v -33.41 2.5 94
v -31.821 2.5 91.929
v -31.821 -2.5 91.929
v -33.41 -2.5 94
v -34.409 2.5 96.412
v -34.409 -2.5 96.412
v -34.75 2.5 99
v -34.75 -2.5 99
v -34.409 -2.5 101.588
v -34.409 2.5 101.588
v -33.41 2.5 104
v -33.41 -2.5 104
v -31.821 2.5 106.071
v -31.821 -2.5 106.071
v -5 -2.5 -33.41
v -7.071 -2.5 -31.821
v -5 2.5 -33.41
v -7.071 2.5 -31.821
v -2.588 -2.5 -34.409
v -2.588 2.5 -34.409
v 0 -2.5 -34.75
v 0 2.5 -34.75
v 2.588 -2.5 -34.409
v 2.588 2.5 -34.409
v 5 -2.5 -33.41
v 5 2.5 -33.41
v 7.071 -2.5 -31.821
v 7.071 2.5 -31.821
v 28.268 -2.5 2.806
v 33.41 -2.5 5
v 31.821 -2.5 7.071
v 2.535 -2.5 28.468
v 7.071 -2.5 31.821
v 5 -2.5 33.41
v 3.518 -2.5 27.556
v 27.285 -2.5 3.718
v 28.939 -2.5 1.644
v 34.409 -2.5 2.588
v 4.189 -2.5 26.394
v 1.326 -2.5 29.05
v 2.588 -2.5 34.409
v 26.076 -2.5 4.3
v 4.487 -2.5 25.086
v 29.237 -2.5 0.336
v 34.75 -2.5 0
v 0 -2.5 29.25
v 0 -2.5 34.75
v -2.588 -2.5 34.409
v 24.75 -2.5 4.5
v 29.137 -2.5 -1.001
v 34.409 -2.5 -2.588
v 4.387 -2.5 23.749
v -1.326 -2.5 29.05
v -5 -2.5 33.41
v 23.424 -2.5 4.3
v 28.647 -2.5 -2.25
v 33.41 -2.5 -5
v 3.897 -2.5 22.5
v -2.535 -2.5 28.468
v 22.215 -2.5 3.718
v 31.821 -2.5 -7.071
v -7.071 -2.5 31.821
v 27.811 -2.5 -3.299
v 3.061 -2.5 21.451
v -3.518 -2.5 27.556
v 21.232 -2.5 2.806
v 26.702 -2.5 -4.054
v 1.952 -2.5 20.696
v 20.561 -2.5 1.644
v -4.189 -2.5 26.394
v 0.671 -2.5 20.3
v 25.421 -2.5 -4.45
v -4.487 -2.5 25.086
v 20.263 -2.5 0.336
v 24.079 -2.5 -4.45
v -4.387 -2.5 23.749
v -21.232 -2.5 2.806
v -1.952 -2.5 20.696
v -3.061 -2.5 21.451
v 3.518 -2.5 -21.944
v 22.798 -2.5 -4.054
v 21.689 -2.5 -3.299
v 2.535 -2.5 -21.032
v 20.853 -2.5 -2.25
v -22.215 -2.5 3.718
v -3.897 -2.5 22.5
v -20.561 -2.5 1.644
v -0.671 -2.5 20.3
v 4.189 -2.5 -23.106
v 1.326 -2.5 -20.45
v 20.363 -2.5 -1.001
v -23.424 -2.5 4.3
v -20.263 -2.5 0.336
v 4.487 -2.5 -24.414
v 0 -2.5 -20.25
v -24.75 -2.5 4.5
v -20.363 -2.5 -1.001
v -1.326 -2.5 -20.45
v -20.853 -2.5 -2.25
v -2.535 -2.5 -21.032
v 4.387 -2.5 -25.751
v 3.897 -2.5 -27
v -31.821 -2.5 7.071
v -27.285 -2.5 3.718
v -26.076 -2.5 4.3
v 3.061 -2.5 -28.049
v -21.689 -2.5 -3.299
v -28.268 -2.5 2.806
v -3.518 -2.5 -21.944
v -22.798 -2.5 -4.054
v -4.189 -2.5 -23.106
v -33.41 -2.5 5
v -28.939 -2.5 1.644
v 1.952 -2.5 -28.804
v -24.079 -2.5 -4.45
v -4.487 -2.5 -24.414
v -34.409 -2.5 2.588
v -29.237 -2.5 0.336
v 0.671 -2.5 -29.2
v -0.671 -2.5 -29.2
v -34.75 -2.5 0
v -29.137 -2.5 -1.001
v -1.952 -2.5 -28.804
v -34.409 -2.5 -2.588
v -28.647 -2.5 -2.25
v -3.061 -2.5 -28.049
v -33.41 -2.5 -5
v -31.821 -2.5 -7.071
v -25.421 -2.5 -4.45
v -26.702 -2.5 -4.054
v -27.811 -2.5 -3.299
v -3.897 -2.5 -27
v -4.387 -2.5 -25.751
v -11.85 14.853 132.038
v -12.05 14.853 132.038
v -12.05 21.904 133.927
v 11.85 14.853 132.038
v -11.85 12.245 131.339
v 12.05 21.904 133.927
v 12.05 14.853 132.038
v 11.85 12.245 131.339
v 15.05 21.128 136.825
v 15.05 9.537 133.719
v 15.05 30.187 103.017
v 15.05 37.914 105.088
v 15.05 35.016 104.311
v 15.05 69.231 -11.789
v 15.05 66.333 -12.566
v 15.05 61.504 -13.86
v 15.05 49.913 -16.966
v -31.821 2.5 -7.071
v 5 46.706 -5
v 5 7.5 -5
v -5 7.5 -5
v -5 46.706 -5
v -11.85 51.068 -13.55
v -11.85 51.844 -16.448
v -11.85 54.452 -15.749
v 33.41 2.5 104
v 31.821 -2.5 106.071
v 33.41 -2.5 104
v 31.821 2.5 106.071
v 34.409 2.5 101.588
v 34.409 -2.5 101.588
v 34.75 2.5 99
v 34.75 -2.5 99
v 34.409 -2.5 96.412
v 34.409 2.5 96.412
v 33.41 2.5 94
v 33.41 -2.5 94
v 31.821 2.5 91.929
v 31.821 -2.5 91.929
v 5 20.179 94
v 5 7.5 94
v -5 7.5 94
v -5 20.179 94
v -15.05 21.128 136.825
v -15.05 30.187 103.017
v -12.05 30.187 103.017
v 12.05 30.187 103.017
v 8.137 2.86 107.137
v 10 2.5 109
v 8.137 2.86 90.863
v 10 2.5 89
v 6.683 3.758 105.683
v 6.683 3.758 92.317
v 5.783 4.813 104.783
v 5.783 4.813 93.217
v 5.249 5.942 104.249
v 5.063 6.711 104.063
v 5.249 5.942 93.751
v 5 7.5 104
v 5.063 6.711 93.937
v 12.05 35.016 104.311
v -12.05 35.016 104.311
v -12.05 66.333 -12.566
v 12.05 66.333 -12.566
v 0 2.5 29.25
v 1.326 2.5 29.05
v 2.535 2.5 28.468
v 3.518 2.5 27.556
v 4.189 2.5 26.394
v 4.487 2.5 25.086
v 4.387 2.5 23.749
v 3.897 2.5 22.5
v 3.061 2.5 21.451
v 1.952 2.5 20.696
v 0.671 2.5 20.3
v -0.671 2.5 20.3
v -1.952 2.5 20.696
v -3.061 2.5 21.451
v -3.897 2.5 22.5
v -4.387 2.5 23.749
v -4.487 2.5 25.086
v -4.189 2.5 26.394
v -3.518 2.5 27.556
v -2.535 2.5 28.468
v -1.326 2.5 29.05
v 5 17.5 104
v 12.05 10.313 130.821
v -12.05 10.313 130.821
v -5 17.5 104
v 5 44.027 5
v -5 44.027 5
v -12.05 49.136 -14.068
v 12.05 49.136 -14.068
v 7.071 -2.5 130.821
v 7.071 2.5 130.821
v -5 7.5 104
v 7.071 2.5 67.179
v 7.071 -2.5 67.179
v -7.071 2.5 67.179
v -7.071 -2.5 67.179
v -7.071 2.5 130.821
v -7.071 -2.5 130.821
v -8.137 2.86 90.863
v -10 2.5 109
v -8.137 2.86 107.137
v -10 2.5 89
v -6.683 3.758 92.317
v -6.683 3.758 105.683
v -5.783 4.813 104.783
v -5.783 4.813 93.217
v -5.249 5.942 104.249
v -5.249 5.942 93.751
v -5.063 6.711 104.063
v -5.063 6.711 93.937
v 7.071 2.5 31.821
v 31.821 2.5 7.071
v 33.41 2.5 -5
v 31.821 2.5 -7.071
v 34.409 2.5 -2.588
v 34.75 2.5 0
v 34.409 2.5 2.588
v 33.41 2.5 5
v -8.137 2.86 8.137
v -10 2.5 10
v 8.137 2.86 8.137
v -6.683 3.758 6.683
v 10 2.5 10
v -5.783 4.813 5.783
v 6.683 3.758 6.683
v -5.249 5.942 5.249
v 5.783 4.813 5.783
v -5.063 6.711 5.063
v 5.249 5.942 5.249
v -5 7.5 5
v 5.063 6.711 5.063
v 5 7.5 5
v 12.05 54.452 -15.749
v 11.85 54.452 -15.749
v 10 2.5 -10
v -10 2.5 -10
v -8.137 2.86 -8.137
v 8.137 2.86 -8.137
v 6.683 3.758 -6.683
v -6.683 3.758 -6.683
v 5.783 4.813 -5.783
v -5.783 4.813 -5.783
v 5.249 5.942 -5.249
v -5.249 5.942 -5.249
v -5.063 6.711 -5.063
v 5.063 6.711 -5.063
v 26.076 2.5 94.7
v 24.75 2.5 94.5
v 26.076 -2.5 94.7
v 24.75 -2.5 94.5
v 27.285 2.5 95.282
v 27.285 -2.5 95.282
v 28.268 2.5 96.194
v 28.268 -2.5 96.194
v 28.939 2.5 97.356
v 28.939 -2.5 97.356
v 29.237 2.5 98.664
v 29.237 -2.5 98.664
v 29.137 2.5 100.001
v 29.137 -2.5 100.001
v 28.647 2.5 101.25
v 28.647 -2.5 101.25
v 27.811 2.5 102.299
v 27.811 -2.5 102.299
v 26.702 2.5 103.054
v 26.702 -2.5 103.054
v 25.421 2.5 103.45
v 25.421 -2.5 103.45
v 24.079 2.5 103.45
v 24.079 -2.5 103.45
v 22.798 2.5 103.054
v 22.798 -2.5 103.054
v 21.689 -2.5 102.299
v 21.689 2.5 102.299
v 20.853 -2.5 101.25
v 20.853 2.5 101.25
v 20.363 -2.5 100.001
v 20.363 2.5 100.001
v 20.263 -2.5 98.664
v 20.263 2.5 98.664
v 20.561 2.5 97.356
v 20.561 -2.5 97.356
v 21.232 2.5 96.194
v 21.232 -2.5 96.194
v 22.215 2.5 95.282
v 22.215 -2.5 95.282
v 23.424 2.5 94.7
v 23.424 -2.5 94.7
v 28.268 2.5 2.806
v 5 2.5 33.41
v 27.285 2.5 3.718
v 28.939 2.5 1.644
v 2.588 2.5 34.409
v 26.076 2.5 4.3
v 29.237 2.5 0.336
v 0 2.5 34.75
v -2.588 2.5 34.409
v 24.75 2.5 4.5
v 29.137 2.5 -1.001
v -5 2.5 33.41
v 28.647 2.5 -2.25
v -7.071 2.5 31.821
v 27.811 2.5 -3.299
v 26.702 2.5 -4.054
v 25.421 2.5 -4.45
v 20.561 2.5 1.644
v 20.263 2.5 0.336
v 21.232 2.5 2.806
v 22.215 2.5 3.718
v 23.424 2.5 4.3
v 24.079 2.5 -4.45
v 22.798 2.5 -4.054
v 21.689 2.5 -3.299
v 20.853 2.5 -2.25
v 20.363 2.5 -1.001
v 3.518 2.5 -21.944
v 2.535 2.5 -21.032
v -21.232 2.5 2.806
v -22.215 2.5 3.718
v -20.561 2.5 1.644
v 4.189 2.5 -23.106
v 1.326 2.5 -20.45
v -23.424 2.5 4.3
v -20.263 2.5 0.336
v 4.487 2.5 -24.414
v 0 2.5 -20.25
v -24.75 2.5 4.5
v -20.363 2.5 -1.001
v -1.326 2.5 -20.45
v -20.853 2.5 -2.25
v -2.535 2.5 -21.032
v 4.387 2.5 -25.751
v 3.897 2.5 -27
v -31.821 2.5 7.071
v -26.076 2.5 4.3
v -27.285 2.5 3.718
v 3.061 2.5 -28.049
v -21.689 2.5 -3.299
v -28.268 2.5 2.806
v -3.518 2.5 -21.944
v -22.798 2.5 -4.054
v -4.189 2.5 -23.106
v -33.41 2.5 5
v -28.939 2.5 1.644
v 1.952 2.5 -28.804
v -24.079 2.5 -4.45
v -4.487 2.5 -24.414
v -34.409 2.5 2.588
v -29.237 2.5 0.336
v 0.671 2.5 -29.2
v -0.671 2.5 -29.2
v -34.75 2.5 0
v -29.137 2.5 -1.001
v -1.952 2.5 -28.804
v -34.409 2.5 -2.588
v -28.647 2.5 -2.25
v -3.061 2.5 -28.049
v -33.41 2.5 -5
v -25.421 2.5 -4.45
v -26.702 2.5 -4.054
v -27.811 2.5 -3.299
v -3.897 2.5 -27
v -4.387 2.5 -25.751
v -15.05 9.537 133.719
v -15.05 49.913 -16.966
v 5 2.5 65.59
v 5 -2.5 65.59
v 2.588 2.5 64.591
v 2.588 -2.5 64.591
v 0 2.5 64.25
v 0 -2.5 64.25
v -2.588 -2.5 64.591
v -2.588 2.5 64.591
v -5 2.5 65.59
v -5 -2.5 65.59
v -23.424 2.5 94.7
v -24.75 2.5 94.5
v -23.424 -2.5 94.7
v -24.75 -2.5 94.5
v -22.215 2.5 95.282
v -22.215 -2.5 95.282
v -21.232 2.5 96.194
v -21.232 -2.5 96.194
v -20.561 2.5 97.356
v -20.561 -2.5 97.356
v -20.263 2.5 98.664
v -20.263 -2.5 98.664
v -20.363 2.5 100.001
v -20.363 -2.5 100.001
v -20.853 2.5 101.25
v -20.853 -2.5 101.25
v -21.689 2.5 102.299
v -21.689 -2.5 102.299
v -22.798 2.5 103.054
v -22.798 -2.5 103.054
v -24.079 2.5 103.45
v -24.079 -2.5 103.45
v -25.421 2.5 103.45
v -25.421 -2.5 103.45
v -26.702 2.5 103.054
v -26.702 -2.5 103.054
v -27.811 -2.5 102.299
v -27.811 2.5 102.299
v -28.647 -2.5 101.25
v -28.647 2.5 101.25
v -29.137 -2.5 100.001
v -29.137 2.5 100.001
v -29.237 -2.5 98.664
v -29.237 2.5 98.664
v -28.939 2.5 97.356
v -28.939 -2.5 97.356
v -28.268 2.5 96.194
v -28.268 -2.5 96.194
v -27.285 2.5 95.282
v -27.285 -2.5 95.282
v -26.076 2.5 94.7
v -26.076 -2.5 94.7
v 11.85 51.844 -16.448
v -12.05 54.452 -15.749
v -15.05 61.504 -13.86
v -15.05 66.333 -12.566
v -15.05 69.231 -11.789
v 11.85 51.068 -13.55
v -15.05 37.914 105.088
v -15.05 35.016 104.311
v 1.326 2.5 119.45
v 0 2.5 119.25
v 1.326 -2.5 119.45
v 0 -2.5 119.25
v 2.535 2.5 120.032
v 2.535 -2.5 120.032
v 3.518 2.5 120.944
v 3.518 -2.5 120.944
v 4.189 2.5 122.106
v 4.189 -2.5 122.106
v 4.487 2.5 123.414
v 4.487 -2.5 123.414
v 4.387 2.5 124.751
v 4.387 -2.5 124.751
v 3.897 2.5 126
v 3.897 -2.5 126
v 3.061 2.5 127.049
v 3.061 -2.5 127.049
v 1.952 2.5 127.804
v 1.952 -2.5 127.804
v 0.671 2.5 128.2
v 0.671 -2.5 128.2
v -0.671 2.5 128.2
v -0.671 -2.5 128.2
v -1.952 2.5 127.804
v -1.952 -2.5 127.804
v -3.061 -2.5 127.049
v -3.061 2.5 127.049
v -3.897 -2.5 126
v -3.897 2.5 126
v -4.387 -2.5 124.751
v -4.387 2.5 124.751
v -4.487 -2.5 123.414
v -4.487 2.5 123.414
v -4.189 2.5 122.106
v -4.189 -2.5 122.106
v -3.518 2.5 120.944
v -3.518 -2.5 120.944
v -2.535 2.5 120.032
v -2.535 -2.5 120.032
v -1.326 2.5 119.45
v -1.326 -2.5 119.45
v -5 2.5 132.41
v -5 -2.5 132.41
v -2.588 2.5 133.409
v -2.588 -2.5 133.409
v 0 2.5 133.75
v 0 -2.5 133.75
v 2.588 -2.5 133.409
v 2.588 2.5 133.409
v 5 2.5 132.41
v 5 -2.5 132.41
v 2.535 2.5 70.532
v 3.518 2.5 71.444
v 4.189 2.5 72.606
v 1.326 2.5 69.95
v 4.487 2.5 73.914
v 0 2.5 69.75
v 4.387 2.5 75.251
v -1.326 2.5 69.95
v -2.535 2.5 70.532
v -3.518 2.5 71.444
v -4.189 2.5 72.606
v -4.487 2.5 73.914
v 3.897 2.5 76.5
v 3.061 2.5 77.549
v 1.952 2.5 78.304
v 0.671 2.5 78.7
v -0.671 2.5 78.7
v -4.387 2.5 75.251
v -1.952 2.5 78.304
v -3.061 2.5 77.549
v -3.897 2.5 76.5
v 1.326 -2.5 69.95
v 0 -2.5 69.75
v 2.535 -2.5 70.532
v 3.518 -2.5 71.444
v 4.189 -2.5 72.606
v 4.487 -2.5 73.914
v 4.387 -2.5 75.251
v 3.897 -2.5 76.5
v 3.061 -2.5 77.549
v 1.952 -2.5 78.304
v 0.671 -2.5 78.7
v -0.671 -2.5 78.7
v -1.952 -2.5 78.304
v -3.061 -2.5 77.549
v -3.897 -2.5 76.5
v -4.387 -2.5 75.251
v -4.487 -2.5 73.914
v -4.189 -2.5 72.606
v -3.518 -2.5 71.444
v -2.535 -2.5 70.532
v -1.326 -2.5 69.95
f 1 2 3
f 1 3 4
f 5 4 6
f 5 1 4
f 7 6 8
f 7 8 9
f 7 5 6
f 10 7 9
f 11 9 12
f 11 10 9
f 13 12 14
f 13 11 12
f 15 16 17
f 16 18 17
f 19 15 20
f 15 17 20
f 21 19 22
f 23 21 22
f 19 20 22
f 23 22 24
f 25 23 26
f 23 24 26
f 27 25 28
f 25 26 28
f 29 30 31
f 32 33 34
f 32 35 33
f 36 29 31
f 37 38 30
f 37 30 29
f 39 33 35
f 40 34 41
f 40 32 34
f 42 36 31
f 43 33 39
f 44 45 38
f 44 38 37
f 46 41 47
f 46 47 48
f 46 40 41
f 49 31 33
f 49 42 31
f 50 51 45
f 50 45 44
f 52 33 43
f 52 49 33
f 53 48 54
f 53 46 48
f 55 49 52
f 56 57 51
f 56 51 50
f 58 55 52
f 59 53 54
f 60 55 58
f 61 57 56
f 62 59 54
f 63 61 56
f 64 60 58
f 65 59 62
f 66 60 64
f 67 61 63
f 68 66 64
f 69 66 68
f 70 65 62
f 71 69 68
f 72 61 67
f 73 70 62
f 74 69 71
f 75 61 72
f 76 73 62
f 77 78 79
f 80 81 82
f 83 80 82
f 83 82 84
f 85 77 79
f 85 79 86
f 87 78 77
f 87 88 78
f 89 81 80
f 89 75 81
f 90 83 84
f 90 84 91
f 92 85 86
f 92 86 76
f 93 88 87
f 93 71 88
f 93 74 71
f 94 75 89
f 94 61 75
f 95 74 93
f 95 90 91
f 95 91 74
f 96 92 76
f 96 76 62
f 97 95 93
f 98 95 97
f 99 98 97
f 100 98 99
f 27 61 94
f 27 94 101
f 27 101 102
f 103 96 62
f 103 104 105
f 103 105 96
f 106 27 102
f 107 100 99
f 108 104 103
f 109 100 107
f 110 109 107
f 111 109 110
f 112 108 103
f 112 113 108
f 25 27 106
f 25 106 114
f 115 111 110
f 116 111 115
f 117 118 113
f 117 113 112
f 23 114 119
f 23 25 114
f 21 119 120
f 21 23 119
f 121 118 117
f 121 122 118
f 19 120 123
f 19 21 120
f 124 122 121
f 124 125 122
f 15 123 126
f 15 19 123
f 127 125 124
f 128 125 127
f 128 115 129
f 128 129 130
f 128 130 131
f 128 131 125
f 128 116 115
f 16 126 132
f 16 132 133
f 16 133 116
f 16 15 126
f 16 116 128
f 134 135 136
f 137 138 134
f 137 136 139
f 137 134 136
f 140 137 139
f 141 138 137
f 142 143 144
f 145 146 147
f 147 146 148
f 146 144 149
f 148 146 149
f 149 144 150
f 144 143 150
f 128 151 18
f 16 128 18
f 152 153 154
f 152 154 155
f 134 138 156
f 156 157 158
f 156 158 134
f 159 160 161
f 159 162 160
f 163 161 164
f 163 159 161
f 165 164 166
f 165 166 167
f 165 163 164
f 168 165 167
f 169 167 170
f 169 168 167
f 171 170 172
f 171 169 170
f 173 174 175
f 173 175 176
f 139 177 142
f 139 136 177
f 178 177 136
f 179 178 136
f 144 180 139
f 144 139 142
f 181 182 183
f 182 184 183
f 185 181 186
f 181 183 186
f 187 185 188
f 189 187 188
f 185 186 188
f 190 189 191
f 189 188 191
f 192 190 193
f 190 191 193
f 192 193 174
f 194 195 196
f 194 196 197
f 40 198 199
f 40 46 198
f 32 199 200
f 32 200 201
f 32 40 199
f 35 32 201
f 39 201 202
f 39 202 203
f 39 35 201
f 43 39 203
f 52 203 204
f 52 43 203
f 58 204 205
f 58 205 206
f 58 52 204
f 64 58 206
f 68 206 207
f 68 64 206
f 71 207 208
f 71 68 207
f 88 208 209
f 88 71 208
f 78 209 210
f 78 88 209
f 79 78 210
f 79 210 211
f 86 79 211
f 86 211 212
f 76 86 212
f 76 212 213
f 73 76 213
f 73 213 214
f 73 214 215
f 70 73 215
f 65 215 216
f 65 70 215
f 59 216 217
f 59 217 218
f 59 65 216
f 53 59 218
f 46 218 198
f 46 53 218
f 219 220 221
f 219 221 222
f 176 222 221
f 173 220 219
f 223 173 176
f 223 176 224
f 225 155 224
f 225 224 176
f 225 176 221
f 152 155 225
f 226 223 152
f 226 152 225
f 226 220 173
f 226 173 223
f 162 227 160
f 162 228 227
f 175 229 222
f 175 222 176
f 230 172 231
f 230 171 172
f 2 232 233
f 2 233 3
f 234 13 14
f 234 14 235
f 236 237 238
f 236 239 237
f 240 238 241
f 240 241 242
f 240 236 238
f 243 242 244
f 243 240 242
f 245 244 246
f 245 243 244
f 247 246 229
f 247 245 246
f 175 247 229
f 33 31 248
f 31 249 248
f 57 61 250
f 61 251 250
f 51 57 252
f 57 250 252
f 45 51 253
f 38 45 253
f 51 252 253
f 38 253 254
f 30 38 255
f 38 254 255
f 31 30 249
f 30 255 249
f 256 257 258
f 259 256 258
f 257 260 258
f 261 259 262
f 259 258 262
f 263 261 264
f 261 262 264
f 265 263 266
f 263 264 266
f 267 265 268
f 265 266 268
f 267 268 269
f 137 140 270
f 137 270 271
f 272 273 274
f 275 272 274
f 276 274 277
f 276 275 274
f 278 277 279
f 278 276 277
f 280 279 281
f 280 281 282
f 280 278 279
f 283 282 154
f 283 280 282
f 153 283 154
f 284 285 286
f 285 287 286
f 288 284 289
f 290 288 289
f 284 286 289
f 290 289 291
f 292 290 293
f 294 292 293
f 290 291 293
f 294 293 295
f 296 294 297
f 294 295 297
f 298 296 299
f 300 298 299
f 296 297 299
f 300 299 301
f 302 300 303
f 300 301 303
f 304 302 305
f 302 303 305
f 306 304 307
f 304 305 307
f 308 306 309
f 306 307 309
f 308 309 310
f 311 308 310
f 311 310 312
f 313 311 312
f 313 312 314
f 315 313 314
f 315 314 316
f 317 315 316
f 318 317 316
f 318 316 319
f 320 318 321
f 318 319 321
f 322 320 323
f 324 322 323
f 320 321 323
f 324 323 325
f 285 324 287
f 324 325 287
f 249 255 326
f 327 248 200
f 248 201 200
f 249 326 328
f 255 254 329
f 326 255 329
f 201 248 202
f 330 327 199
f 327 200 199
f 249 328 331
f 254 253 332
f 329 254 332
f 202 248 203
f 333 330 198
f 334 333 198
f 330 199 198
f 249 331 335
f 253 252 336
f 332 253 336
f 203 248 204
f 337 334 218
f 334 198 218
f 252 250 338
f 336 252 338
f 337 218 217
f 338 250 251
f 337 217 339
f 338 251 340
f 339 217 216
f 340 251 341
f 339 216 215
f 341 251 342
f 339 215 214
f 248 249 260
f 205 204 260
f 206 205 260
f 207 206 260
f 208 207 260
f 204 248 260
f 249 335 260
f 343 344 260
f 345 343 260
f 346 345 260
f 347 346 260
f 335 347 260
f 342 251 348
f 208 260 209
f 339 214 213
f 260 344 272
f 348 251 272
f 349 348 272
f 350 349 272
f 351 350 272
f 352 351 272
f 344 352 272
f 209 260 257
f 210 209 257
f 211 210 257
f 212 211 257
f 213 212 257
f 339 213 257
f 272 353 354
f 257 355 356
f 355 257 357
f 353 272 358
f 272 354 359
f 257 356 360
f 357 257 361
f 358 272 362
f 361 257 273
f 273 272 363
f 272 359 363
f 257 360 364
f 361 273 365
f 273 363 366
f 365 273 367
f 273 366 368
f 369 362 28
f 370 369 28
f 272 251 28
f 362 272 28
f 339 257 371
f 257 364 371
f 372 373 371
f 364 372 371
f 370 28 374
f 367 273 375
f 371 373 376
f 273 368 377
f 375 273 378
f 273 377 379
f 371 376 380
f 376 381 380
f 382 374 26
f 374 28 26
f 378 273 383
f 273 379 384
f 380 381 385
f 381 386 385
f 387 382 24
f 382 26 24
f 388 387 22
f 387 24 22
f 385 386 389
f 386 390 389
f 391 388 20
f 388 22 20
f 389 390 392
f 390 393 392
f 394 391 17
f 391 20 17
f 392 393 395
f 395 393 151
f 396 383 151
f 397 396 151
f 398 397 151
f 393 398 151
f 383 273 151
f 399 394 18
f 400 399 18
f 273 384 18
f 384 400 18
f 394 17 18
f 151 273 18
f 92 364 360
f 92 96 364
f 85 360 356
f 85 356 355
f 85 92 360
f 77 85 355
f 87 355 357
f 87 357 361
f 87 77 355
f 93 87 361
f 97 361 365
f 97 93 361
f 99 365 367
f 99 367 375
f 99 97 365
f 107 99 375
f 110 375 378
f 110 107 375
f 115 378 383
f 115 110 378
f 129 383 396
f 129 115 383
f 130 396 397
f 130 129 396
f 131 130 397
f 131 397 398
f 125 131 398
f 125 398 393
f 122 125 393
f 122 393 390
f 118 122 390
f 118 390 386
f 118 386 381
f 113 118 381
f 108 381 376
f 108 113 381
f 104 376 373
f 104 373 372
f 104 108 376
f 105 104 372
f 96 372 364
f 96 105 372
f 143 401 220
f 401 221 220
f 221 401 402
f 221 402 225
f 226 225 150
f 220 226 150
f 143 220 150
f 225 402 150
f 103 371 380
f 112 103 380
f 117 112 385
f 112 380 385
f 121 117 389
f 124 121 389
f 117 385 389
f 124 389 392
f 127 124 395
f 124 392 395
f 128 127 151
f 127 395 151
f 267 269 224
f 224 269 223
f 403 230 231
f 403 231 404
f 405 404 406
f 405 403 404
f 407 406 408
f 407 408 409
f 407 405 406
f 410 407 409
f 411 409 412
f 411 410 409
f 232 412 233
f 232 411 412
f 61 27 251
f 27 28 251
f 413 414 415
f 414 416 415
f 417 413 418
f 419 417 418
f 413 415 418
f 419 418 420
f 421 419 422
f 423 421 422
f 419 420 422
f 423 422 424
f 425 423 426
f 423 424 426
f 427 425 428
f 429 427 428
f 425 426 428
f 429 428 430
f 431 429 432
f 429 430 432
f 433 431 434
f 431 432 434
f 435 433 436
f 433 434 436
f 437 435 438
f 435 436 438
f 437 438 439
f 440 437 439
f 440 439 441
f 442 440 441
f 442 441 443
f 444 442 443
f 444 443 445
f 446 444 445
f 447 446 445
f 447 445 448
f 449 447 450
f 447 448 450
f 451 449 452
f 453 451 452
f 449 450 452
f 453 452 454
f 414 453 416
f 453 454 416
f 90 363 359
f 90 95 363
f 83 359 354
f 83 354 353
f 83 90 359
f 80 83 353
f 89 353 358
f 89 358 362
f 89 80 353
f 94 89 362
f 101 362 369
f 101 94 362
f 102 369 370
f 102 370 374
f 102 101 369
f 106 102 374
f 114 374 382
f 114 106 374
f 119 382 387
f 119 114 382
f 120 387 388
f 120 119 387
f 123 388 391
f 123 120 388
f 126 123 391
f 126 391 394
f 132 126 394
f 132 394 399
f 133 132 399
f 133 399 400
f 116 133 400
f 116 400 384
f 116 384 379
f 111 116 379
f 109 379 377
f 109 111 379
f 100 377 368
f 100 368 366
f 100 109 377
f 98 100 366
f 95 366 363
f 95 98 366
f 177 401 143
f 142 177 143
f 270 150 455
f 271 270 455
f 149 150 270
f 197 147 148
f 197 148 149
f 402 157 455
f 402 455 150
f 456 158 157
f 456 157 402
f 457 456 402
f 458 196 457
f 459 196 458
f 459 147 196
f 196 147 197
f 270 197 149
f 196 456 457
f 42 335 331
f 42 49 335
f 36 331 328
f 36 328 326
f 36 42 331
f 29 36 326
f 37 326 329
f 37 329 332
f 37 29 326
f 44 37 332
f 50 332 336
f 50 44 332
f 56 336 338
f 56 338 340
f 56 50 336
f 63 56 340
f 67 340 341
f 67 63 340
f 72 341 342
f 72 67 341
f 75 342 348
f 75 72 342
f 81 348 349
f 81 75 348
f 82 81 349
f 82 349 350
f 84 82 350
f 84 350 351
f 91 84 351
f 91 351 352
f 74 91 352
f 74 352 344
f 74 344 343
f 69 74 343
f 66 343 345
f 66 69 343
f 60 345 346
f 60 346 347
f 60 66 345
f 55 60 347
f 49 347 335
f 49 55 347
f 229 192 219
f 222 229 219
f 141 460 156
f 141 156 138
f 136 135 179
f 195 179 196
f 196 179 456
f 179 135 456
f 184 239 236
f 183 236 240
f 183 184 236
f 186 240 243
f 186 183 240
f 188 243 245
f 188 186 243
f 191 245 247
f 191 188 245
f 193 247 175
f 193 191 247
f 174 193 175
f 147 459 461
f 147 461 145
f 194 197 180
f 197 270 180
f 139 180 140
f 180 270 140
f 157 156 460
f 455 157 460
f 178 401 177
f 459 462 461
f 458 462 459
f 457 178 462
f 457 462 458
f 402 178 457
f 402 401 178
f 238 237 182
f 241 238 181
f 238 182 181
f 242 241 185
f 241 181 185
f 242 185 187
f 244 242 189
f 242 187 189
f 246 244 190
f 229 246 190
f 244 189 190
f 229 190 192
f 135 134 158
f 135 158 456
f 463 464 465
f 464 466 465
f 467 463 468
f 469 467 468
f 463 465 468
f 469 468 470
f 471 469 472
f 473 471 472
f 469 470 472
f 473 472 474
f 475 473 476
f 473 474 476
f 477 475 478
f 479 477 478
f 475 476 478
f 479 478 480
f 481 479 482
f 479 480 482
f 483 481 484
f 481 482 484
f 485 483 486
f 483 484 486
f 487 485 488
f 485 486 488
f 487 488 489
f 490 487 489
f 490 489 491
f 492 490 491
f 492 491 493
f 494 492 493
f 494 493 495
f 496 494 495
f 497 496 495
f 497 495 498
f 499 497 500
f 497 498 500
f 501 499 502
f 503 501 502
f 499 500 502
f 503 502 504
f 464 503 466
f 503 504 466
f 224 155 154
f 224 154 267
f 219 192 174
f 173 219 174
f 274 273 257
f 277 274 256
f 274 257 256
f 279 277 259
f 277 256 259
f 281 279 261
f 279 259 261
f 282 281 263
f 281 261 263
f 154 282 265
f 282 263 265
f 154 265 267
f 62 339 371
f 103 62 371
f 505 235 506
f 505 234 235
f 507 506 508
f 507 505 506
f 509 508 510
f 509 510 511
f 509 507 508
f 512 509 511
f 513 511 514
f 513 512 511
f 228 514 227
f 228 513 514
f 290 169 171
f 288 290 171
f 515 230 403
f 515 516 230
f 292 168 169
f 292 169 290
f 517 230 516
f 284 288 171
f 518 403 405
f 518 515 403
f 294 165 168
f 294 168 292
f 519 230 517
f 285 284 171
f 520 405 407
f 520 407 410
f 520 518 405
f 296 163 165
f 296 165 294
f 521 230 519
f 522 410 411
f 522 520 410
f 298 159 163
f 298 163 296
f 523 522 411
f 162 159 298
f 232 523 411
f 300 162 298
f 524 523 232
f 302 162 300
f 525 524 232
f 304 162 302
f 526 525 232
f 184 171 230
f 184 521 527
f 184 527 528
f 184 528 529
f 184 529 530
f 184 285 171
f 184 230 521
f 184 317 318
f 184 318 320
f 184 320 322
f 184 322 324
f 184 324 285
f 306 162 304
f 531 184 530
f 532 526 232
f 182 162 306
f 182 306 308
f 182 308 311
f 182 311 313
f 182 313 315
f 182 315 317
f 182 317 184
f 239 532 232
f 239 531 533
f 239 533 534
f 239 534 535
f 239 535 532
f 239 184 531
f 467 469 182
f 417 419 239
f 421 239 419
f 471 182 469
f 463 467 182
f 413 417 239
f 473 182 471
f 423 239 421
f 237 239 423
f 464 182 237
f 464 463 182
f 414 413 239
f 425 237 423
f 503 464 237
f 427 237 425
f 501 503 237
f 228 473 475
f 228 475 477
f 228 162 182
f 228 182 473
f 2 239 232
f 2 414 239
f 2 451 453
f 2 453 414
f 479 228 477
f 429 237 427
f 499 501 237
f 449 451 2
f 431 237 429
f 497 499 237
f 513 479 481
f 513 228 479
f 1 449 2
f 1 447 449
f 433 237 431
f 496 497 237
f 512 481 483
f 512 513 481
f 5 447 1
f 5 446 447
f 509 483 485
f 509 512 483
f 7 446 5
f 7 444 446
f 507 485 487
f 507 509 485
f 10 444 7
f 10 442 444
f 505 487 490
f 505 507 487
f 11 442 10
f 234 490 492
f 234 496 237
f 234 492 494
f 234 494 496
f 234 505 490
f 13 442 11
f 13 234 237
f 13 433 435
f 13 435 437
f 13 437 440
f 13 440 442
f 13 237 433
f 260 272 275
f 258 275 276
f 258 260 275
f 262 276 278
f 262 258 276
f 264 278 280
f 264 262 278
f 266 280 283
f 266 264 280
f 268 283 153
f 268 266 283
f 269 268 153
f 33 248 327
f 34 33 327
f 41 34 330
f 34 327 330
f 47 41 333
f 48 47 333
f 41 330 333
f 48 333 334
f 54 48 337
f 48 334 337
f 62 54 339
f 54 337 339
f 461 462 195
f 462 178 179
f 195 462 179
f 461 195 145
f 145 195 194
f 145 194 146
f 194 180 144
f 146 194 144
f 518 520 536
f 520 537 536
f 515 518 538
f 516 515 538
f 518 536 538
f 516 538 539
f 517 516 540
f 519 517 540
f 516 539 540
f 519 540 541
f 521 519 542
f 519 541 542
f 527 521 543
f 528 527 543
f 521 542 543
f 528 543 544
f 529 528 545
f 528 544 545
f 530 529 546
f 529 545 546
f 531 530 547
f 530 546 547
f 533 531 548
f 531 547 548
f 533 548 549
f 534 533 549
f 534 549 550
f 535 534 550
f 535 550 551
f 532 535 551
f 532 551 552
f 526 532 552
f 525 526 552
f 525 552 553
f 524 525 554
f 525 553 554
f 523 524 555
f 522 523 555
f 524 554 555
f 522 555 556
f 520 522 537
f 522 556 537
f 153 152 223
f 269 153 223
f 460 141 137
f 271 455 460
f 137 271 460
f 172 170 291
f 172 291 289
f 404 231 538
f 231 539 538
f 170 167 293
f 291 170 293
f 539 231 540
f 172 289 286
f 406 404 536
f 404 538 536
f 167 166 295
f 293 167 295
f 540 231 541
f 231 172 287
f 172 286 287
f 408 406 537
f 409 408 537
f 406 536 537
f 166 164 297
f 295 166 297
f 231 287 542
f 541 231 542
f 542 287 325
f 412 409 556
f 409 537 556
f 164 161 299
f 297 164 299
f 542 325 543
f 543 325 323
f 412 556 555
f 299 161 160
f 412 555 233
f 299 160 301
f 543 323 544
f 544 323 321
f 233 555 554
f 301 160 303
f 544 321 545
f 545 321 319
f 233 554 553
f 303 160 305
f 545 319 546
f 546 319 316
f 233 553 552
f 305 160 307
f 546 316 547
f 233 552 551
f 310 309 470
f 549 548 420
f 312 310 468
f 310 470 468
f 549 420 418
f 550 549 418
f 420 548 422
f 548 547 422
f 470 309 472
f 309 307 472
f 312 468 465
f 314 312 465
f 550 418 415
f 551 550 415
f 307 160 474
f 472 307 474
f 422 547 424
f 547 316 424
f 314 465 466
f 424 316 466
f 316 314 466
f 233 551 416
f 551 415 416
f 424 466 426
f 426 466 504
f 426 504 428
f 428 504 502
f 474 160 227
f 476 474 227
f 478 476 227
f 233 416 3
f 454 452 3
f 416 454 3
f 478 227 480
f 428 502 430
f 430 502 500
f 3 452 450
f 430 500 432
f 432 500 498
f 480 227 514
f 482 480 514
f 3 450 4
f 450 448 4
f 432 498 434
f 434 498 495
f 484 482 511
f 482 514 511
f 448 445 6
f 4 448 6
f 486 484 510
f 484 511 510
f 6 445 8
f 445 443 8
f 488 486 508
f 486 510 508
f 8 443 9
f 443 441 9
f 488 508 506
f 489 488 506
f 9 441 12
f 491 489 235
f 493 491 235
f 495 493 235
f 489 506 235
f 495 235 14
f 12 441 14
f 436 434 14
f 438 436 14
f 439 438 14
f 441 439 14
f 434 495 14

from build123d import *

# Parameters (mm, degrees)
SKETCH1_R                = 4.5
BOSS_EXTRUDE1_DEPTH      = 2.5
SKETCH2_W                = 10
SKETCH2_H                = 45
BOSS_EXTRUDE2_DEPTH      = 5
CUT_EXTRUDE1_DEPTH       = 147.126229678
CUT_EXTRUDE1_DEPTH_BACK  = 147.126229678
BOSS_EXTRUDE3_DEPTH      = 12.05
FILLET1_R                = 5
FILLET2_R                = 5
BOSS_EXTRUDE4_DEPTH      = 10
BOSS_EXTRUDE4_DEPTH_BACK = 2.000004
SKETCH6_W                = 30.1
SKETCH6_H                = 156
SKETCH6_W_2              = 24.1
SKETCH6_H_2              = 150
BOSS_EXTRUDE5_DEPTH      = 5
SKETCH8_W                = 30.1
SKETCH8_H                = 121
BOSS_EXTRUDE6_DEPTH      = 3
CUT_EXTRUDE2_REACH       = 179.268
SKETCH10_W               = 24.1
SKETCH10_H               = 15
SKETCH11_W               = 0.2
SKETCH11_H               = 2.7
BOSS_EXTRUDE7_DEPTH      = 153


with BuildPart() as part:
    # Sketch1 → Boss-Extrude1 (new, symmetric)
    with BuildSketch(Plane(origin=(0, 0, 0), x_dir=(1, 0, 0), z_dir=(0, 1, 0))):
        with BuildLine():
            Line((-31.821067812, 7.071067812), (-7.071067812, 31.821067812))
            ThreePointArc((-7.071067812, 31.821067812), (0, 34.75), (7.071067812, 31.821067812))
            Line((7.071067812, 31.821067812), (31.821067812, 7.071067812))
            ThreePointArc((31.821067812, 7.071067812), (34.75, 0), (31.821067812, -7.071067812))
            Line((31.821067812, -7.071067812), (7.071067812, -31.821067812))
            ThreePointArc((7.071067812, -31.821067812), (0, -34.75), (-7.071067812, -31.821067812))
            Line((-7.071067812, -31.821067812), (-31.821067812, -7.071067812))
            ThreePointArc((-31.821067812, -7.071067812), (-34.75, 0), (-31.821067812, 7.071067812))
        make_face()
        with Locations(Location((0, 24.75, 0), (0, 0, 270))):
            Circle(SKETCH1_R, mode=Mode.SUBTRACT)
        with Locations(Location((24.75, 0, 0), (0, 0, 270))):
            Circle(SKETCH1_R, mode=Mode.SUBTRACT)
        with Locations(Location((0, -24.75, 0), (0, 0, 270))):
            Circle(SKETCH1_R, mode=Mode.SUBTRACT)
        with Locations(Location((-24.75, 0, 0), (0, 0, 270))):
            Circle(SKETCH1_R, mode=Mode.SUBTRACT)
    extrude(amount=BOSS_EXTRUDE1_DEPTH, both=True)


with BuildPart() as body_2:
    # Mirror3: mirrored copy
    add(part.part.mirror(Plane.XY.offset(49.5)))


with BuildPart() as body_3:
    # Sketch2 → Boss-Extrude2 (new, symmetric)
    with BuildSketch(Plane(origin=(0, 0, 0), x_dir=(0, 0, -1), z_dir=(1, 0, 0))):
        with Locations((-99, 25)):
            Rectangle(SKETCH2_W, SKETCH2_H)
    extrude(amount=BOSS_EXTRUDE2_DEPTH, both=True)


with BuildPart() as body_4:
    # Mirror5: mirrored copy
    add(body_3.part.mirror(Plane.XY.offset(49.5)))


with BuildPart() as cut_extrude1_tool:
    # Sketch3 → Cut-Extrude1 (new, two sides: drawn at the far end of the back side and taken through both)
    with BuildSketch(Plane(origin=(0, 0, 0), x_dir=(0, 0, -1), z_dir=(1, 0, 0)).offset(-CUT_EXTRUDE1_DEPTH_BACK)):
        Polygon((-398.060619113, -61.293305417), (-104, 17.5), (5, 46.706461975), (299.060619113, 125.499767392), (141.474008279, 713.621005618), (-555.647229947, 526.827932809), align=None)
    extrude(amount=CUT_EXTRUDE1_DEPTH + CUT_EXTRUDE1_DEPTH_BACK)


with BuildPart() as body_3_1:
    add(body_3.part)

    # Cut-Extrude1: cut by cut_extrude1_tool
    add(cut_extrude1_tool.part, mode=Mode.SUBTRACT)


with BuildPart() as body_4_1:
    add(body_4.part)

    # Cut-Extrude1: cut by cut_extrude1_tool
    add(cut_extrude1_tool.part, mode=Mode.SUBTRACT)

    # Combine2: union part
    add(part.part)

    # Fillet2
    fillet2_edges = [body_4_1.edges().sort_by_distance(p)[0] for p in [
        (-5, 2.5, 0),
        (0, 2.5, 5),
        (0, 2.5, -5),
        (5, 2.5, 0),
    ]]
    fillet(fillet2_edges, radius=FILLET2_R)


with BuildPart() as body_5:
    # Sketch4 → Boss-Extrude3 (new, symmetric)
    with BuildSketch(Plane(origin=(0, 0, 0), x_dir=(0, 0, -1), z_dir=(1, 0, 0))):
        Polygon((-130.821067812, 10.31331654), (14.067806131, 49.136173305), (13.550168041, 51.068024958), (-131.338705902, 12.245168192), align=None)
    extrude(amount=BOSS_EXTRUDE3_DEPTH, both=True)



with BuildPart() as body_2_1:
    add(body_2.part)

    # Combine1: union body 3
    add(body_3_1.part)

    # Fillet1
    fillet1_edges = [body_2_1.edges().sort_by_distance(p)[0] for p in [
        (0, 2.5, 94),
        (5, 2.5, 99),
        (-5, 2.5, 99),
        (0, 2.5, 104),
    ]]
    fillet(fillet1_edges, radius=FILLET1_R)


with BuildPart() as body_5_1:
    add(body_5.part)

    add(body_2_1.part)  # Boss-Extrude4 merges body 2

    add(body_4_1.part)  # Boss-Extrude4 merges body 4
    # Sketch6 → Boss-Extrude4 (add, two sides: drawn at the far end of the back side and taken through both)
    with BuildSketch(Plane(origin=(0, 44.259573936, 11.859317093), x_dir=(1, 0, 0), z_dir=(0, 0.96592582628907, 0.2588190451025143)).offset(-BOSS_EXTRUDE4_DEPTH_BACK)):
        with Locations((0, -48.694165284)):
            Rectangle(SKETCH6_W, SKETCH6_H)
        with Locations((0, -48.694165284)):
            Rectangle(SKETCH6_W_2, SKETCH6_H_2, mode=Mode.SUBTRACT)
    extrude(amount=BOSS_EXTRUDE4_DEPTH + BOSS_EXTRUDE4_DEPTH_BACK)

    # Sketch7 → Boss-Extrude5 (add)
    with BuildSketch(Plane(origin=(0, 53.918832199, 14.447507544), x_dir=(1, 0, 0), z_dir=(0, 0.96592582628907, 0.25881904510251436))):
        Polygon((12.05, 26.305834716), (12.05, -91.694165284), (15.05, -91.694165284), (15.05, 29.305834716), (-15.05, 29.305834716), (-15.05, -91.694165284), (-12.05, -91.694165284), (-12.05, 26.305834716), align=None)
    extrude(amount=BOSS_EXTRUDE5_DEPTH)

    # Sketch8 → Boss-Extrude6 (add)
    with BuildSketch(Plane(origin=(0, 58.74846133, 15.74160277), x_dir=(1, 0, 0), z_dir=(0, 0.96592582628907, 0.25881904510251436))):
        with Locations((0, -31.194165284)):
            Rectangle(SKETCH8_W, SKETCH8_H)
    extrude(amount=BOSS_EXTRUDE6_DEPTH)

    # Sketch10 → Cut-Extrude2 (cut, up to next)
    with BuildSketch(Plane(origin=(0, 6.808451022, -25.409485135), x_dir=(1, 0, 0), z_dir=(0, -0.2588190451025143, 0.96592582628907)), mode=Mode.PRIVATE) as cut_extrude2_sk1:
        with Locations((0, 53.320882651)):
            Rectangle(SKETCH10_W, SKETCH10_H)
    cut_extrude2_tool1 = extrude(cut_extrude2_sk1.sketch, amount=-CUT_EXTRUDE2_REACH, mode=Mode.PRIVATE) & body_5_1.part
    add(cut_extrude2_tool1.solids().sort_by_distance((0, 58.312469, -11.609025))[0], mode=Mode.SUBTRACT)

    # Sketch11 → Boss-Extrude7 (add)
    with BuildSketch(Plane(origin=(0, 7.584908157, -28.307262614), x_dir=(-1, 0, 0), z_dir=(0, 0.2588190451025143, -0.96592582628907))):
        with Locations((-11.95, 47.170882651)):
            Rectangle(SKETCH11_W, SKETCH11_H)
        with Locations((11.95, 47.170882651)):
            Rectangle(SKETCH11_W, SKETCH11_H)
    extrude(amount=-BOSS_EXTRUDE7_DEPTH)


solid = body_5_1.part
